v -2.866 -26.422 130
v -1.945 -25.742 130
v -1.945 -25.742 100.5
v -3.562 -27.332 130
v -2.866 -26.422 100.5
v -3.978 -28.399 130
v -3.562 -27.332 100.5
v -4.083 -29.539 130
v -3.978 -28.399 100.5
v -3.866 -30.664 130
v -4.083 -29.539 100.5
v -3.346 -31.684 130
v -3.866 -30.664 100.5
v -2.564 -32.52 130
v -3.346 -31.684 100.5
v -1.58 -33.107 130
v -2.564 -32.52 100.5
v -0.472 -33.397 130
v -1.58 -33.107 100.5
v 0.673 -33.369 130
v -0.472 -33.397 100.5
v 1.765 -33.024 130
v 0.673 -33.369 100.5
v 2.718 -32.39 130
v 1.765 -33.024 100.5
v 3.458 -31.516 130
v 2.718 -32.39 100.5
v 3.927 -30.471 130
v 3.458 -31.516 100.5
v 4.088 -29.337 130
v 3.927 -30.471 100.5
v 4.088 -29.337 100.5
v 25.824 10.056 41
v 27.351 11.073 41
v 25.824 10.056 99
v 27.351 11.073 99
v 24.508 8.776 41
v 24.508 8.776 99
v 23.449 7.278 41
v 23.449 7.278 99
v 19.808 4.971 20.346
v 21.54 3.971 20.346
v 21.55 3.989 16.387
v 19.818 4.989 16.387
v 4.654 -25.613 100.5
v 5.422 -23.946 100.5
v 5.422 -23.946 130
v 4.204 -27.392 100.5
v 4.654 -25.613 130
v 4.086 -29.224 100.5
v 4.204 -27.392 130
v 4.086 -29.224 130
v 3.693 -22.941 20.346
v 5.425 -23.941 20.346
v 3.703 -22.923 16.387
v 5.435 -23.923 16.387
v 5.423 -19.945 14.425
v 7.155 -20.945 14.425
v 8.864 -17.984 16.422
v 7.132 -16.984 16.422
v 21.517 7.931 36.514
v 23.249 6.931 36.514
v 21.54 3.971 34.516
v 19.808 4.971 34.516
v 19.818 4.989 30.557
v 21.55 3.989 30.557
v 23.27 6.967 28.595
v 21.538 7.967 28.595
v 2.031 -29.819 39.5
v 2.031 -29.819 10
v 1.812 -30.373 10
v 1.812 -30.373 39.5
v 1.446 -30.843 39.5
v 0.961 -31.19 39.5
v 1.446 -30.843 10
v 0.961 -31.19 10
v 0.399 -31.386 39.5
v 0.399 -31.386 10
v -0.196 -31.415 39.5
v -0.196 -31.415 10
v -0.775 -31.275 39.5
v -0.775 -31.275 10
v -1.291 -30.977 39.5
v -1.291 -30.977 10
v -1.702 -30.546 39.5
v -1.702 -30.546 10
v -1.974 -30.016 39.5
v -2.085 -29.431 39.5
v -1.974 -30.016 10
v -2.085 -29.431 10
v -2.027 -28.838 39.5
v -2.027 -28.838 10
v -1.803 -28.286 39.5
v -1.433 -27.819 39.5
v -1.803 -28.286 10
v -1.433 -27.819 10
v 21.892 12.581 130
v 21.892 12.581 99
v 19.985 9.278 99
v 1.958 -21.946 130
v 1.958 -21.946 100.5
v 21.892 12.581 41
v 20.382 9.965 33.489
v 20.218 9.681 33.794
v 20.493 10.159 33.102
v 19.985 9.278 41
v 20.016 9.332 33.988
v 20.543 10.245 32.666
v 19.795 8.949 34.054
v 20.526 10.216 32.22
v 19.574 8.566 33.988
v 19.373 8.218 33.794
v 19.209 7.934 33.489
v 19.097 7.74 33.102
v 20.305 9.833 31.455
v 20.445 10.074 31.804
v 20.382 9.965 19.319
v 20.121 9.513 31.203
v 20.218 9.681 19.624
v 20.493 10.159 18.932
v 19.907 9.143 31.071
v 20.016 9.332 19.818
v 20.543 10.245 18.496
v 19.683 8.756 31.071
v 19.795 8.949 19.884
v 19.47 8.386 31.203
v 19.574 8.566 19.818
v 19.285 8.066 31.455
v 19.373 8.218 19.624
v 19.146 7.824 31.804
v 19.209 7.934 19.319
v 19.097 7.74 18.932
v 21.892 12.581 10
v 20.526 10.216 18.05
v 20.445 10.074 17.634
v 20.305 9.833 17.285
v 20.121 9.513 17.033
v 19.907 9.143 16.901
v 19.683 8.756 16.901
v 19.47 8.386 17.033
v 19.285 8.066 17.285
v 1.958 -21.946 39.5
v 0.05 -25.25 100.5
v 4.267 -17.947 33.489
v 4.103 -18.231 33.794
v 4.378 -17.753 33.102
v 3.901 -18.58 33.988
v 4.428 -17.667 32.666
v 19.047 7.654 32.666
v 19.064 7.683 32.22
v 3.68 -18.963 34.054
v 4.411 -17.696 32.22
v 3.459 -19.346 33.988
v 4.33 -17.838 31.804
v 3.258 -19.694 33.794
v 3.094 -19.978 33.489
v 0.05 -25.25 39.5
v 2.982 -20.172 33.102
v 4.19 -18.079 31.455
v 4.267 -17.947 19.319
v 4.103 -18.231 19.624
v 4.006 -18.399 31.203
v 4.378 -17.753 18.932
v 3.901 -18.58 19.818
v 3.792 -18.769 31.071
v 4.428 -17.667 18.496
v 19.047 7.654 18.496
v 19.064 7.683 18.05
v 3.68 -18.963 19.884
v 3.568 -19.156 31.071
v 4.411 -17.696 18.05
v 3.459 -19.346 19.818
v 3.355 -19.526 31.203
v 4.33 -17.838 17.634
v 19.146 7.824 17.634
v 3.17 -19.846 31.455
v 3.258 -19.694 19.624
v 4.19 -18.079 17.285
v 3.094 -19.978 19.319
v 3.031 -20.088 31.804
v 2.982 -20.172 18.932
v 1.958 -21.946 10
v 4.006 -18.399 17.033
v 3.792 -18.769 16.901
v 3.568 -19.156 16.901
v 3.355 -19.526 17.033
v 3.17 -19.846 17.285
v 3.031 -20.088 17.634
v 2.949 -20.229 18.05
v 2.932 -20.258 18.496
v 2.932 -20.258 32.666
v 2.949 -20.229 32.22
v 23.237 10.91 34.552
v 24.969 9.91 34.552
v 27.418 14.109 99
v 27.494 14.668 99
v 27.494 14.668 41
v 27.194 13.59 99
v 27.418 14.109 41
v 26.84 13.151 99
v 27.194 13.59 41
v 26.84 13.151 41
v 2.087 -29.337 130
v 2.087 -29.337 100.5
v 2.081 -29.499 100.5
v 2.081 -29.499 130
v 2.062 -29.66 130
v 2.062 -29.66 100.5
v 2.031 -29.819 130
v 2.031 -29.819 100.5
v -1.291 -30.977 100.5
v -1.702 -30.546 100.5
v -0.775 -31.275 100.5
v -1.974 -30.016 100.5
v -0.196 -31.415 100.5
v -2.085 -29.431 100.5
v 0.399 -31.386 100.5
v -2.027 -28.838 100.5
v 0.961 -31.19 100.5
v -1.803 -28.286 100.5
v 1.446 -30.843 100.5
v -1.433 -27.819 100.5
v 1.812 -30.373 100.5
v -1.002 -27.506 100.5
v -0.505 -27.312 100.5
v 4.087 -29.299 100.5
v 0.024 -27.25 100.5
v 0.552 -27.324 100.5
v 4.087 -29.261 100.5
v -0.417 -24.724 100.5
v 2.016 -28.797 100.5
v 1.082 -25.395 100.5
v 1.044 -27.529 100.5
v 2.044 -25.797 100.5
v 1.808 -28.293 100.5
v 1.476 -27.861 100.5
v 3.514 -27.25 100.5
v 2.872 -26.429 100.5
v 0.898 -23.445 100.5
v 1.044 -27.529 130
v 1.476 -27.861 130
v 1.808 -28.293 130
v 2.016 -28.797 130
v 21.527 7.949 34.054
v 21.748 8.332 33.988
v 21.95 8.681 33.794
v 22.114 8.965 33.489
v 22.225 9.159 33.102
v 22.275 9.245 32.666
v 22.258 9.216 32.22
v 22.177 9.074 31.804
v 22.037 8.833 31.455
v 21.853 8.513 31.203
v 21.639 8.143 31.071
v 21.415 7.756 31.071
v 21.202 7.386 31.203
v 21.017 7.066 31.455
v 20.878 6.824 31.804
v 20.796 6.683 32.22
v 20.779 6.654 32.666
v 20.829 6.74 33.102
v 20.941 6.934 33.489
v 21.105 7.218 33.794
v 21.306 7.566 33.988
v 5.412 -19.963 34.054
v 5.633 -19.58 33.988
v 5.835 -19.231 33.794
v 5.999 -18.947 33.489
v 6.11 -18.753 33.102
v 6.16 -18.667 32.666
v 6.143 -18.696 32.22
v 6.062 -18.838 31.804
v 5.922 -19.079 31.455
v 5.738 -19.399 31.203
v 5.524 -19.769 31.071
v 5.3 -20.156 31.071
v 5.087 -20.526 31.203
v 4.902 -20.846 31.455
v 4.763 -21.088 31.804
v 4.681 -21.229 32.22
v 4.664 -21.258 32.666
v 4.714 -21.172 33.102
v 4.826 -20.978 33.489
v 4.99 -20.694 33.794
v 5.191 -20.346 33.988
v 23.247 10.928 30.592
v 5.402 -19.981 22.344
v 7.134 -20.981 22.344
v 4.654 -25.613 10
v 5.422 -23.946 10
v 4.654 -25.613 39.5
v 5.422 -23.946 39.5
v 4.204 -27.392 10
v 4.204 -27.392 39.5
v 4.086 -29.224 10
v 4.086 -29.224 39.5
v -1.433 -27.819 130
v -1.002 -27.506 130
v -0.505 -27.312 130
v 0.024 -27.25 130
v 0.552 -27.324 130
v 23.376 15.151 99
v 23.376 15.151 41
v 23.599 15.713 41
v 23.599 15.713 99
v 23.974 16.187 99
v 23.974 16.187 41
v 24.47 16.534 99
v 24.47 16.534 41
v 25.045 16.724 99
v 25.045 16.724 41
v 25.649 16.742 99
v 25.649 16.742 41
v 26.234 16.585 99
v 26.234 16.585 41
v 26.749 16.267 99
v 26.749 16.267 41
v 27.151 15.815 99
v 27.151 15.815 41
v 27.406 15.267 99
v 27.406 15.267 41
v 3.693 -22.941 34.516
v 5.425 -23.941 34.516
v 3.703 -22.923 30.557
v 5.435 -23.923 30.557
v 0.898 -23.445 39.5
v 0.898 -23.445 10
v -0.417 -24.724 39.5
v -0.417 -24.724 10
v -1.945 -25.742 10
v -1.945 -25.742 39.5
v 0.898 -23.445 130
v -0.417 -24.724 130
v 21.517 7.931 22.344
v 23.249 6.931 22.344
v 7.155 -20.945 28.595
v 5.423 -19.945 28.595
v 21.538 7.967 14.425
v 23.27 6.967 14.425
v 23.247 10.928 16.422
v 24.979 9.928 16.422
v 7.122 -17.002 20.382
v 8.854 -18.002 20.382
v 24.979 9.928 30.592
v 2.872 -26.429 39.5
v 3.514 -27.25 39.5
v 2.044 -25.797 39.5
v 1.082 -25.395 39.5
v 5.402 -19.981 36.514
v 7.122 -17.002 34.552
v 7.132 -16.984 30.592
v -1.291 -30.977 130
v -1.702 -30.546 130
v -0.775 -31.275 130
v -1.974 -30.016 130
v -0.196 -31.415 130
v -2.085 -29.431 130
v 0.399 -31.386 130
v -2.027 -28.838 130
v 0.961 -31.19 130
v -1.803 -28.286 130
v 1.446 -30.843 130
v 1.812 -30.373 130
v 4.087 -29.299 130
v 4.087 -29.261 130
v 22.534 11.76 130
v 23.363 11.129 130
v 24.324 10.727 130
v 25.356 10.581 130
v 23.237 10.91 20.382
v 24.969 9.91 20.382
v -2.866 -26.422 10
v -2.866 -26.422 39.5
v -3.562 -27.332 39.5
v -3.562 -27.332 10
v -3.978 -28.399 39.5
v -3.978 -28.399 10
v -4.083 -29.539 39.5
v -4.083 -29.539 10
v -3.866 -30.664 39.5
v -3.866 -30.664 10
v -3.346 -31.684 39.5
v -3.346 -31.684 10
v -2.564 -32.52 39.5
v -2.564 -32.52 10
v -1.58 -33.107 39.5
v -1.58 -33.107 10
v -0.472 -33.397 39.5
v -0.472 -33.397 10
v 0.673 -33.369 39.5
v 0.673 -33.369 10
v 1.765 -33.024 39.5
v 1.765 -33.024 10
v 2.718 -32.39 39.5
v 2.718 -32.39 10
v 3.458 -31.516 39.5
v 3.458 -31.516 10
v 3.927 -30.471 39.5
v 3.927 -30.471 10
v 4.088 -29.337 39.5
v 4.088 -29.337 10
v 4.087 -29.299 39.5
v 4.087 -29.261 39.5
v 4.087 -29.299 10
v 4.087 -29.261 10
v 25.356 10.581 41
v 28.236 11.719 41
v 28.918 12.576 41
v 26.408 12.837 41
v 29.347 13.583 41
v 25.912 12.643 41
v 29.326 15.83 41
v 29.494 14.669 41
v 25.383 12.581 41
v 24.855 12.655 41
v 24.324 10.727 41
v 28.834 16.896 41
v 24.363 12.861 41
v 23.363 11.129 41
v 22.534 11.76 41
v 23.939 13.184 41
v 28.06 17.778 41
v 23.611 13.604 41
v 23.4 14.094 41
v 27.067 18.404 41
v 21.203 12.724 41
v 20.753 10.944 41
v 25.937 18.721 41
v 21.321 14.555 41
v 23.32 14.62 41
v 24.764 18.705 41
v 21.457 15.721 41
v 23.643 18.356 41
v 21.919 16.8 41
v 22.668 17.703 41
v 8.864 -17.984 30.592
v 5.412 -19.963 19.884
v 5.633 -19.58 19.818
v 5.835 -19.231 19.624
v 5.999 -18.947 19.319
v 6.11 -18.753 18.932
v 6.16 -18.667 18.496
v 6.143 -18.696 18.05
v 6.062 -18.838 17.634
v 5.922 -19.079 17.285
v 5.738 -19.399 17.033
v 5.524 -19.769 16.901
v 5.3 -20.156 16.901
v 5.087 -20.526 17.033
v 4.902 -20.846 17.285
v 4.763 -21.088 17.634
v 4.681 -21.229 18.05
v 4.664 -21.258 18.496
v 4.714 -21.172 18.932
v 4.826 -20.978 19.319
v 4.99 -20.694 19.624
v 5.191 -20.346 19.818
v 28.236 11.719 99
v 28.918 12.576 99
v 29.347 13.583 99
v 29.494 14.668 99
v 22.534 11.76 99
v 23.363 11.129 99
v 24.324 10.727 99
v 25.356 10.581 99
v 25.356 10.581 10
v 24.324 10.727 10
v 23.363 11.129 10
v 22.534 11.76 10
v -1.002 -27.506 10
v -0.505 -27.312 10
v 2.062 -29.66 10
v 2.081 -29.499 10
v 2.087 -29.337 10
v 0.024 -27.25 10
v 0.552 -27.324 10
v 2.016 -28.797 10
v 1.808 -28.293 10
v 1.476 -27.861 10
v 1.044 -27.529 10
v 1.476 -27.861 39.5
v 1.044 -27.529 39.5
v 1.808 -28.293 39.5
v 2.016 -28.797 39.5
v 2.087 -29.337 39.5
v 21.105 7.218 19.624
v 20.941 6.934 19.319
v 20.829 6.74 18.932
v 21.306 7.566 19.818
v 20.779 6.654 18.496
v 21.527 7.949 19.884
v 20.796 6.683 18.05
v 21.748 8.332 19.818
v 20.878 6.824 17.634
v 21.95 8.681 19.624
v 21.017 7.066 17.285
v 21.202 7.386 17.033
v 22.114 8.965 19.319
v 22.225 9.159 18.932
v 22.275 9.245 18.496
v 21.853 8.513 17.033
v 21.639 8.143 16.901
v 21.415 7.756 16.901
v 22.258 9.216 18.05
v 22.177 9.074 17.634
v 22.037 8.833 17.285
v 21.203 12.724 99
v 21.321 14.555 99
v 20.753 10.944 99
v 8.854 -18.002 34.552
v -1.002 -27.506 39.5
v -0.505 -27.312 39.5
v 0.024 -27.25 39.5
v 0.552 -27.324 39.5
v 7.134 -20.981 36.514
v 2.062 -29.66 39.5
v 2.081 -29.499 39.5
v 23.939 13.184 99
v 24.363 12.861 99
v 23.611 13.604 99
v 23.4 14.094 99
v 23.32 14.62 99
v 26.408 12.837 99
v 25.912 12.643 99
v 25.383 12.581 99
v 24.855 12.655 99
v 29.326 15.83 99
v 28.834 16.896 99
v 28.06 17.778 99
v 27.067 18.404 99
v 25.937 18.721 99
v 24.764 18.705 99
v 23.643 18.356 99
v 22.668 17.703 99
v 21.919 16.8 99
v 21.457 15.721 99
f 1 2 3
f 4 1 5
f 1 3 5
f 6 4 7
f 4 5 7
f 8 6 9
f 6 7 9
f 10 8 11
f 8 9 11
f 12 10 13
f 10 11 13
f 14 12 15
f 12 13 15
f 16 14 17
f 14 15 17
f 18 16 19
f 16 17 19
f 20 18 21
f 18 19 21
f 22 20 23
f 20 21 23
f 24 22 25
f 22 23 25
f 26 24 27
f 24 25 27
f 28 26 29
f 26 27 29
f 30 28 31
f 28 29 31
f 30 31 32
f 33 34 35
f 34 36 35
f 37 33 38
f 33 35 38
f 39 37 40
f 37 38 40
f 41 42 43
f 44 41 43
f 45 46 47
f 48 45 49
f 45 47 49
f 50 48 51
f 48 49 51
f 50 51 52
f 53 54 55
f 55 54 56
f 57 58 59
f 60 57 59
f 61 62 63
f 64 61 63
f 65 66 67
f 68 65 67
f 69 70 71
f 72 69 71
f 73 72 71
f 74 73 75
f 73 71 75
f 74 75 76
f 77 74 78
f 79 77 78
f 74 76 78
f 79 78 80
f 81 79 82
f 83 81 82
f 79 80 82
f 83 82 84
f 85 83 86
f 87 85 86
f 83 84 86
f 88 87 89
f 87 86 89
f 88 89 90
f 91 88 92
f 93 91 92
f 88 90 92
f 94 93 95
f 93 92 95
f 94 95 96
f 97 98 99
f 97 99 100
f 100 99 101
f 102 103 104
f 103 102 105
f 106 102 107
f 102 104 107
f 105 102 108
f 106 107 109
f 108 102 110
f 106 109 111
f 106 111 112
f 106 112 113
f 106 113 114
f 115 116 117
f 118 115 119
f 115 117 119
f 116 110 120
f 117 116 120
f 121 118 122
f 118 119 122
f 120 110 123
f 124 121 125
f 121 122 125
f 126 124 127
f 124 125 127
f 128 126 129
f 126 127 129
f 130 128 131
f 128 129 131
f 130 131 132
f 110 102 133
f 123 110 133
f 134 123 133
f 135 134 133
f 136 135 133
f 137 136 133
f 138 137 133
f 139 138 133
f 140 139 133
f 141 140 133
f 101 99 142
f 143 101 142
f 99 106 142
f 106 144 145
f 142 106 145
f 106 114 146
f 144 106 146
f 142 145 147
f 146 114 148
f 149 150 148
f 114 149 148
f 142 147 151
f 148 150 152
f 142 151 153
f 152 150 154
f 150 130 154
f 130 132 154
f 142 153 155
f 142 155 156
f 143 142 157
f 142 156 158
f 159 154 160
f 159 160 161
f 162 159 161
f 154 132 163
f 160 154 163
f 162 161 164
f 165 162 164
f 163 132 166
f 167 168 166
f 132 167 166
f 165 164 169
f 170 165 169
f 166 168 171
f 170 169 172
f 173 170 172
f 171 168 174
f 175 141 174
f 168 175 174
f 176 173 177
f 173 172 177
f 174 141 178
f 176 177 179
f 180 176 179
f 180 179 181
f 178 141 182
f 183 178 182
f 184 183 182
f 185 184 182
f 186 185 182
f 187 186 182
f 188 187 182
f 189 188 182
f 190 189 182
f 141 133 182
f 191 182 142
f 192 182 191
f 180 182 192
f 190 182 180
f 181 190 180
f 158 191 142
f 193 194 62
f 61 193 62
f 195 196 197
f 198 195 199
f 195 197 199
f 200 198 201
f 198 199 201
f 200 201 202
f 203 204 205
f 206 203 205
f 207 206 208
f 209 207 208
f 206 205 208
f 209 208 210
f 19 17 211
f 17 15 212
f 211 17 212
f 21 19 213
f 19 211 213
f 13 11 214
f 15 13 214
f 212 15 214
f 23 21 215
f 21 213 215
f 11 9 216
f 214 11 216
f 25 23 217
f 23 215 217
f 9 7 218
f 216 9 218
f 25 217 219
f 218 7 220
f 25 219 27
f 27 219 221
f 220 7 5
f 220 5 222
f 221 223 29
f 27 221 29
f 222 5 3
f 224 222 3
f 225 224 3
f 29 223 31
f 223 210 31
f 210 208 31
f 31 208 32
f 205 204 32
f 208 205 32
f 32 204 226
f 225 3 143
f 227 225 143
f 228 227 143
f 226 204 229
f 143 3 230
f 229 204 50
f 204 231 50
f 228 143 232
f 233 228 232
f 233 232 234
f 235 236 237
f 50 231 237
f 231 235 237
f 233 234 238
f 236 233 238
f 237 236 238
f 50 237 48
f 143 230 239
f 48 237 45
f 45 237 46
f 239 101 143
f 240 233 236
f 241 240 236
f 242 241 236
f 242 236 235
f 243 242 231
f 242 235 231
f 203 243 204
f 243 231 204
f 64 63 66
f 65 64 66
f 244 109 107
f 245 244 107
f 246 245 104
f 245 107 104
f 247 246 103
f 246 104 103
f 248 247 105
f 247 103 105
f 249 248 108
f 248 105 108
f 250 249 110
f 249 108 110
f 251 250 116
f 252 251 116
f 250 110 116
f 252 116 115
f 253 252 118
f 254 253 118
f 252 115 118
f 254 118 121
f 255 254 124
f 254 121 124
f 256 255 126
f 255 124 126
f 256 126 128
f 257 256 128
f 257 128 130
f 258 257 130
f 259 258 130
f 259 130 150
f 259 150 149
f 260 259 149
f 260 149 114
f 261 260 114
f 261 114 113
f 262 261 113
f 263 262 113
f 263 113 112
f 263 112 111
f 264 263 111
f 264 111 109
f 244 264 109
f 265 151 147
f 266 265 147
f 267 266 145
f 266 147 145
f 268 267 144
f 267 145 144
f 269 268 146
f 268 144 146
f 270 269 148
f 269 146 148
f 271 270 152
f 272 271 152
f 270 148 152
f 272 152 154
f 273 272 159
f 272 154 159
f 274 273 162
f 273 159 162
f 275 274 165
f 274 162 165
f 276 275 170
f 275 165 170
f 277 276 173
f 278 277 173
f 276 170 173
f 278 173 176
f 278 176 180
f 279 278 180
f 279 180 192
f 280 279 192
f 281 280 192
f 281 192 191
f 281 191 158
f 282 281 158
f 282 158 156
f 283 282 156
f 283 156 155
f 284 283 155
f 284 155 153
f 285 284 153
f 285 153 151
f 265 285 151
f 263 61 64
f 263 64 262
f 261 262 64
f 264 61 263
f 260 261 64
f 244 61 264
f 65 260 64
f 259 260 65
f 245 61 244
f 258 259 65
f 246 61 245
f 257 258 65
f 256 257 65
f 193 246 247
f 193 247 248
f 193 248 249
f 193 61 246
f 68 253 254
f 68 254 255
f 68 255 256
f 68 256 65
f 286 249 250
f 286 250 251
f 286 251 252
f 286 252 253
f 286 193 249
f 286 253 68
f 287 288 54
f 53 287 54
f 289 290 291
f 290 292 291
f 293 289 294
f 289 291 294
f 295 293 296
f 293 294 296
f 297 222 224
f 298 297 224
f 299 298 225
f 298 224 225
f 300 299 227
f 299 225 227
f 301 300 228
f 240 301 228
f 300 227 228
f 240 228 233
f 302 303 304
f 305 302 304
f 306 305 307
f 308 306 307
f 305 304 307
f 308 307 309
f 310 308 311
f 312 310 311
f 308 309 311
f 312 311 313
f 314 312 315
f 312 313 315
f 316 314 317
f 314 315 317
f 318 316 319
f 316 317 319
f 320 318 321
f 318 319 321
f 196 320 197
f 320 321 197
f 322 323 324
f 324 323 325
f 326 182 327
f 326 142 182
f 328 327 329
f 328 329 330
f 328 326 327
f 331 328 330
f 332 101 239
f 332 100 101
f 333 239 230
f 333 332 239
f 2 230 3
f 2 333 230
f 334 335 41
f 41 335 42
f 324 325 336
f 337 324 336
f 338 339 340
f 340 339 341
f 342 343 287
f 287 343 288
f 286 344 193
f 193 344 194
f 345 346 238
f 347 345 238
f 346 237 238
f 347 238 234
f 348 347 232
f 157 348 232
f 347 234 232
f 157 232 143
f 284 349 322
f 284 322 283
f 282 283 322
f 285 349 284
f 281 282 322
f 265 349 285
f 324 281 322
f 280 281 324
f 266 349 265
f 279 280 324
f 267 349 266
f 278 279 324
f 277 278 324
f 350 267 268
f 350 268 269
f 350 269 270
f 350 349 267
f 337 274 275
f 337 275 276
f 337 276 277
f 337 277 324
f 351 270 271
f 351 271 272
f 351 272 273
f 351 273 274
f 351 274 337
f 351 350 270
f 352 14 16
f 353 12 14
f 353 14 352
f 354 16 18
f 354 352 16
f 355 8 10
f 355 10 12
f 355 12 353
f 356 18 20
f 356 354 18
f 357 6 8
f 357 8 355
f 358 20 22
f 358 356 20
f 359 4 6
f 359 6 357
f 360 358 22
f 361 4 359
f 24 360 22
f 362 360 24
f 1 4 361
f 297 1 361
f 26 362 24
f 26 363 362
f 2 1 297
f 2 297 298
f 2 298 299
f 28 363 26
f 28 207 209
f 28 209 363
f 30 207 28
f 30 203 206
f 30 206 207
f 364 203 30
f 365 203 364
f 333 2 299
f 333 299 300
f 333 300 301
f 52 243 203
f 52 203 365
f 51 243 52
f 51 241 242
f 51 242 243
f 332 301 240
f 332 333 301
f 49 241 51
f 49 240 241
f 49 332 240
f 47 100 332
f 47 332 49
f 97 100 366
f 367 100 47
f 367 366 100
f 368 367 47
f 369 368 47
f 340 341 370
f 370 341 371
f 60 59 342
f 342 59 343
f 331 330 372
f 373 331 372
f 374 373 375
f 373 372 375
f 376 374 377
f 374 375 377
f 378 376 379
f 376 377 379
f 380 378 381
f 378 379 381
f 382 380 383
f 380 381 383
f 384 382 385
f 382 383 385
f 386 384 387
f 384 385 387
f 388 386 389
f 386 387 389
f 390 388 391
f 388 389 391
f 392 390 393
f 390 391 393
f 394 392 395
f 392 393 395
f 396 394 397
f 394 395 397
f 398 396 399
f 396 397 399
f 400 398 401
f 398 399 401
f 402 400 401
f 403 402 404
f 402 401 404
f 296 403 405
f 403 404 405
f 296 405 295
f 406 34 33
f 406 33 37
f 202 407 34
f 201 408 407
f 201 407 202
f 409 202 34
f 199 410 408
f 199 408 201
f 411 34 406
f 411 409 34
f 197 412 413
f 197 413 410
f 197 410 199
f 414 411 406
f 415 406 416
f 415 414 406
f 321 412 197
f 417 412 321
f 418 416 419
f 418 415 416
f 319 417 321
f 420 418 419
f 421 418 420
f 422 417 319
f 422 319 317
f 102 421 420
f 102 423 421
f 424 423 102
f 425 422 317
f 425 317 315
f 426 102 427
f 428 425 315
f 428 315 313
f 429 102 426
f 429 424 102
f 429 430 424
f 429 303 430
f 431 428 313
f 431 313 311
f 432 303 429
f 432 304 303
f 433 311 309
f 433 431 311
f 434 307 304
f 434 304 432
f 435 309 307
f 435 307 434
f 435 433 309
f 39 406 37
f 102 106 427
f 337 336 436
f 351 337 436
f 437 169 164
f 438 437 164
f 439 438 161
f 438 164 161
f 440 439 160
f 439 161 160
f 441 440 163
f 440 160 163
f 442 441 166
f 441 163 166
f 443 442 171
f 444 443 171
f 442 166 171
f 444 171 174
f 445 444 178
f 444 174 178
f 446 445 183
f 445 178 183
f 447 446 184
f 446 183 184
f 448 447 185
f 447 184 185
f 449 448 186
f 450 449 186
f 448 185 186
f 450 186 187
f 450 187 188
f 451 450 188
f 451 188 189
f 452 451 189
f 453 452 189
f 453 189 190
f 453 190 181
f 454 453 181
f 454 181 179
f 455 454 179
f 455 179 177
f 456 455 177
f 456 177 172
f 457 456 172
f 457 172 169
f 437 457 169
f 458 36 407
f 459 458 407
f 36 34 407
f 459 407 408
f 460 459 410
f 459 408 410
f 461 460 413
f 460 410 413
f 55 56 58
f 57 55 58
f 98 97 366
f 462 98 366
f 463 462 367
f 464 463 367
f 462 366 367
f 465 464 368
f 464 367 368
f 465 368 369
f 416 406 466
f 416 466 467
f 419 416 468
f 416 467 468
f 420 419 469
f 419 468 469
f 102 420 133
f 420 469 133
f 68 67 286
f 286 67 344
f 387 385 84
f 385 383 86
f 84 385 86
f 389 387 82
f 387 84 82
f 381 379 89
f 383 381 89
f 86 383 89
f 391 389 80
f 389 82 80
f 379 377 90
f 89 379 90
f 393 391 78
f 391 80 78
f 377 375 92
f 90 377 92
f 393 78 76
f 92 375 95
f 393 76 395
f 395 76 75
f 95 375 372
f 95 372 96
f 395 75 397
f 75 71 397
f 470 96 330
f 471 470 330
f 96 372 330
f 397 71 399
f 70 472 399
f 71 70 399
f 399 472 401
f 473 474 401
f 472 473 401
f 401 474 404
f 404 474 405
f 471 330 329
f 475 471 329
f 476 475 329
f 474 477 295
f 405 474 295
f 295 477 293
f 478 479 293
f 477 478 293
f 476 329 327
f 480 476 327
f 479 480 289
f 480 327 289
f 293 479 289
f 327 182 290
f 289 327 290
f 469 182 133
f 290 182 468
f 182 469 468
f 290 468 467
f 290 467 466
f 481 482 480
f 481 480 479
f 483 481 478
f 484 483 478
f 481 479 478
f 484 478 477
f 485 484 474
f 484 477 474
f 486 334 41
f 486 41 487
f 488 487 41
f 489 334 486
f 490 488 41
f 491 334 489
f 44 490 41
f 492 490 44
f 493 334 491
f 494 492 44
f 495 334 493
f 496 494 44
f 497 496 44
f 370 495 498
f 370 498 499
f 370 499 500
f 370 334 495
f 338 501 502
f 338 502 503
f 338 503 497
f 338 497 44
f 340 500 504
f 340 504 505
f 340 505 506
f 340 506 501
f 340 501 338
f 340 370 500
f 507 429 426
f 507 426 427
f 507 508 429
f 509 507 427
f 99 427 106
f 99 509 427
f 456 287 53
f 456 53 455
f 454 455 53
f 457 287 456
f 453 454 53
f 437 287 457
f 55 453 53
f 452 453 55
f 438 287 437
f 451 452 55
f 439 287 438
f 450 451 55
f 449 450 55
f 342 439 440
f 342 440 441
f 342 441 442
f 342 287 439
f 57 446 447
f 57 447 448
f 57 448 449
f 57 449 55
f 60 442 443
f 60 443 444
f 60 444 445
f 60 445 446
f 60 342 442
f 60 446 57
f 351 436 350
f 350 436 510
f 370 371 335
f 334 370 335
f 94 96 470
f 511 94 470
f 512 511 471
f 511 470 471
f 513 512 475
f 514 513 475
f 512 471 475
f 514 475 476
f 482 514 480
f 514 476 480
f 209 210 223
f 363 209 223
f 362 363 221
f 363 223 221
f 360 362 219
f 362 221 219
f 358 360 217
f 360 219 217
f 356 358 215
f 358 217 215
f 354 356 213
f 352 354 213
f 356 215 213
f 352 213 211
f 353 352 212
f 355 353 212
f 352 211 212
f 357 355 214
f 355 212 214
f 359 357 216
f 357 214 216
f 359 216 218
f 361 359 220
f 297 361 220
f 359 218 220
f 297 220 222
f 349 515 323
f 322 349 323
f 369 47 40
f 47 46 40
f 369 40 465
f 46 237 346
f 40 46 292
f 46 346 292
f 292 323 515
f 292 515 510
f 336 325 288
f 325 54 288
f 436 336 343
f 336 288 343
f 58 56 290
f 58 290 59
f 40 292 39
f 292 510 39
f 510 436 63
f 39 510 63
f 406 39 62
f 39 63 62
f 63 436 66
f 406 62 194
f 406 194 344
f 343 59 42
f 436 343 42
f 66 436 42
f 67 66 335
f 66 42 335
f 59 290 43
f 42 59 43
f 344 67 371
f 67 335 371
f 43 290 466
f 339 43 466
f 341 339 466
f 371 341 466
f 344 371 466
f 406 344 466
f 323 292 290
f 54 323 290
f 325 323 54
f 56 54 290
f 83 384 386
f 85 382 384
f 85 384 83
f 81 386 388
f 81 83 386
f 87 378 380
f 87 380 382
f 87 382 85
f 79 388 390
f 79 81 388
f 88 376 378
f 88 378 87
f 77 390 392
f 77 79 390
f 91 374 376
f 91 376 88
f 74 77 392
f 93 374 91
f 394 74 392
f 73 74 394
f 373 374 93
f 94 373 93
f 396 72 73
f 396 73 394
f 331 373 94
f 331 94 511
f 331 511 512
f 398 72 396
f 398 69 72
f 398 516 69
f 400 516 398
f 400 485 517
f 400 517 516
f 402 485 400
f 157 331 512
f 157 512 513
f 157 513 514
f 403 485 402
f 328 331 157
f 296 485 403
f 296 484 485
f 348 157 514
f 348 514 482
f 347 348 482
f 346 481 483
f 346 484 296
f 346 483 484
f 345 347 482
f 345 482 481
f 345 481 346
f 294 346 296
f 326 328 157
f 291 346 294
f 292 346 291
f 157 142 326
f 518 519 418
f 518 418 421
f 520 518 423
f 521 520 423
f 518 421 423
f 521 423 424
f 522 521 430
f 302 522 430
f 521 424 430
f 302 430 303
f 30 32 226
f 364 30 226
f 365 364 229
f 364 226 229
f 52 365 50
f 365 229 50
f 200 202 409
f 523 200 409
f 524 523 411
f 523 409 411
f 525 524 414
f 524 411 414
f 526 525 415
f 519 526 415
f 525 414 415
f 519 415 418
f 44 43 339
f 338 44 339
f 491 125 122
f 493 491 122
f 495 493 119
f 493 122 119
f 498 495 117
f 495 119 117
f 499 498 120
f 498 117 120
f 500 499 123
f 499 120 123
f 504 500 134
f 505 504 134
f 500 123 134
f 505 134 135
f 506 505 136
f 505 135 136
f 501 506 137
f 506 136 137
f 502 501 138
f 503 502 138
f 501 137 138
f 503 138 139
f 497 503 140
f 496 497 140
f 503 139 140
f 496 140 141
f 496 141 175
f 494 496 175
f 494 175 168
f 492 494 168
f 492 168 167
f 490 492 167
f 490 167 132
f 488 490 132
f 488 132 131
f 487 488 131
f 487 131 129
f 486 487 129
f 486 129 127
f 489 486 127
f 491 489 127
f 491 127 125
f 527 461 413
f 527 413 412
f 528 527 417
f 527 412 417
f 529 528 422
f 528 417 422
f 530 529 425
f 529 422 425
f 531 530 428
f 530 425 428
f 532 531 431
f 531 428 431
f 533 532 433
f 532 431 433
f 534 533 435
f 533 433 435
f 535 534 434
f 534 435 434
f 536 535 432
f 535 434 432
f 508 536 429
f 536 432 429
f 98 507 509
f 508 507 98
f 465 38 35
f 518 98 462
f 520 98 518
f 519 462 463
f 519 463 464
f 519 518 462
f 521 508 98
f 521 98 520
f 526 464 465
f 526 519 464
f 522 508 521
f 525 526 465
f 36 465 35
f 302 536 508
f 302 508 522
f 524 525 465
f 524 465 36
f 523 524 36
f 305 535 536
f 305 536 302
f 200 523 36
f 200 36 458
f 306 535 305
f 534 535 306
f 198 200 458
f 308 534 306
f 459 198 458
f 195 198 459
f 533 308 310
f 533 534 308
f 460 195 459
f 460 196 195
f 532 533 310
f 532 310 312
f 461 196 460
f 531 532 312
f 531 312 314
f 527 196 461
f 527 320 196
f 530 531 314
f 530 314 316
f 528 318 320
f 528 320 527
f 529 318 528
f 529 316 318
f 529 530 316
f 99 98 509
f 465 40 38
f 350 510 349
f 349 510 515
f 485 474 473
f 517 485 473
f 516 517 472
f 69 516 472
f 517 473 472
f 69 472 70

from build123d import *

# Parameters (mm, degrees)
SKETCH2_R               = 1.5875
BOSS_EXTRUDE1_DEPTH     = 10
BOSS_EXTRUDE2_DEPTH     = 120
SKETCH4_R               = 4.0875
CUT_EXTRUDE1_DEPTH      = 30.5
CUT_EXTRUDE1_DEPTH_BACK = 30.5
SKETCH5_R               = 4.0875
CUT_EXTRUDE2_DEPTH      = 31
SKETCH6_R               = 4.0875
CUT_EXTRUDE3_DEPTH      = 31
FILLET1_R               = 10
SKETCH7_R               = 1.5
CUT_EXTRUDE4_DEPTH      = 4
SKETCH8_R               = 1.5
CUT_EXTRUDE5_DEPTH      = 2


with BuildPart() as part:
    # Sketch2 → Boss-Extrude1 (new body)
    with BuildSketch(Plane.XY):
        with BuildLine():
            Line((0, -27.7495), (0, 0))
            Line((0, 0), (38.1, 0))
            ThreePointArc((38.1, 0), (-26.940768363, 26.940768363), (0, -38.1))
            Line((0, -38.1), (0, -30.9245))
            ThreePointArc((0, -30.9245), (-1.5875, -29.337), (0, -27.7495))
        make_face()
        with Locations((-25.406587271, 14.6685)):
            Circle(SKETCH2_R, mode=Mode.SUBTRACT)
        with Locations((25.406587271, 14.6685)):
            Circle(SKETCH2_R, mode=Mode.SUBTRACT)
        with BuildLine():
            Line((38.1, 0), (0, 0))
            Line((0, 0), (0, -27.7495))
            ThreePointArc((0, -27.7495), (1.122532015, -28.214467985), (1.5875, -29.337))
            ThreePointArc((1.5875, -29.337), (1.122532015, -30.459532015), (0, -30.9245))
            Line((0, -30.9245), (0, -38.1))
            ThreePointArc((0, -38.1), (26.940768363, -26.940768363), (38.1, 0))
        make_face()
    extrude(amount=BOSS_EXTRUDE1_DEPTH)


with BuildPart() as body_2:
    # Sketch3 → Boss-Extrude2 (new body)
    with BuildSketch(Plane.XY.offset(10)):
        with BuildLine():
            ThreePointArc((29.494087271, 14.6685), (24.324372064, 18.610132466), (21.892146477, 12.581309985))
            Line((21.892146477, 12.581309985), (23.37551462, 15.150578976))
            ThreePointArc((23.37551462, 15.150578976), (25.649272347, 16.741845172), (27.494087271, 14.6685))
            ThreePointArc((27.494087271, 14.6685), (27.323499399, 13.841998855), (26.839616236, 13.150578976))
            Line((26.839616236, 13.150578976), (25.356248092, 10.581309985))
            ThreePointArc((25.356248092, 10.581309985), (28.279033516, 11.760457906), (29.494087271, 14.6685))
        make_face()
        with BuildLine():
            Line((24.362837271, 12.86067197), (23.362837271, 11.128621162))
            ThreePointArc((23.362837271, 11.128621162), (24.324372064, 10.726867534), (25.356248092, 10.581309985))
            Line((25.356248092, 10.581309985), (26.839616236, 13.150578976))
            ThreePointArc((26.839616236, 13.150578976), (25.649272347, 12.595154828), (24.362837271, 12.86067197))
        make_face()
        with BuildLine():
            ThreePointArc((21.892146477, 12.581309985), (22.534141026, 11.760457906), (23.362837271, 11.128621162))
            Line((23.362837271, 11.128621162), (24.362837271, 12.86067197))
            ThreePointArc((24.362837271, 12.86067197), (23.489675143, 13.841998855), (23.37551462, 15.150578976))
            Line((23.37551462, 15.150578976), (21.892146477, 12.581309985))
        make_face()
        with BuildLine():
            Line((23.362837271, 11.128621162), (2.04375, -25.797121162))
            ThreePointArc((2.04375, -25.797121162), (2.872446245, -26.428957906), (3.514440794, -27.249809985))
            Line((3.514440794, -27.249809985), (25.356248092, 10.581309985))
            ThreePointArc((25.356248092, 10.581309985), (24.324372064, 10.726867534), (23.362837271, 11.128621162))
        make_face()
        with BuildLine():
            ThreePointArc((0.050339179, -25.249809985), (1.082215206, -25.395367534), (2.04375, -25.797121162))
            Line((2.04375, -25.797121162), (23.362837271, 11.128621162))
            ThreePointArc((23.362837271, 11.128621162), (22.534141026, 11.760457906), (21.892146477, 12.581309985))
            Line((21.892146477, 12.581309985), (0.050339179, -25.249809985))
        make_face()
        with BuildLine():
            ThreePointArc((-1.433028965, -27.819078976), (-0.242685076, -27.263654828), (1.04375, -27.52917197))
            Line((1.04375, -27.52917197), (2.04375, -25.797121162))
            ThreePointArc((2.04375, -25.797121162), (1.082215206, -25.395367534), (0.050339179, -25.249809985))
            Line((0.050339179, -25.249809985), (-1.433028965, -27.819078976))
        make_face()
        with BuildLine():
            Line((2.04375, -25.797121162), (1.04375, -27.52917197))
            ThreePointArc((1.04375, -27.52917197), (1.80782803, -28.29325), (2.0875, -29.337))
            ThreePointArc((2.0875, -29.337), (2.073345172, -29.579685076), (2.03107265, -29.819078976))
            Line((2.03107265, -29.819078976), (3.514440794, -27.249809985))
            ThreePointArc((3.514440794, -27.249809985), (2.872446245, -26.428957906), (2.04375, -25.797121162))
        make_face()
        with BuildLine():
            ThreePointArc((2.03107265, -29.819078976), (-1.04375, -31.14482803), (-1.433028965, -27.819078976))
            Line((-1.433028965, -27.819078976), (0.050339179, -25.249809985))
            ThreePointArc((0.050339179, -25.249809985), (-2.908042094, -32.209446245), (4.0875, -29.337))
            ThreePointArc((4.0875, -29.337), (3.941632466, -28.254784794), (3.514440794, -27.249809985))
            Line((3.514440794, -27.249809985), (2.03107265, -29.819078976))
        make_face()
    extrude(amount=BOSS_EXTRUDE2_DEPTH)

    # Sketch4 → Cut-Extrude1 (cut, two sides)
    with BuildSketch(Plane.XY.offset(70)) as cut_extrude1_sk:
        with Locations((0, -29.337)):
            Circle(SKETCH4_R)
    extrude(amount=CUT_EXTRUDE1_DEPTH, mode=Mode.SUBTRACT)
    extrude(cut_extrude1_sk.sketch, amount=-CUT_EXTRUDE1_DEPTH_BACK, mode=Mode.SUBTRACT)

    # Sketch5 → Cut-Extrude2 (cut)
    with BuildSketch(Plane(origin=(0, 0, 10), x_dir=(-1, 0, 0), z_dir=(0, 0, -1))):
        with Locations((-25.406587271, 14.6685)):
            Circle(SKETCH5_R)
    extrude(amount=-CUT_EXTRUDE2_DEPTH, mode=Mode.SUBTRACT)

    # Sketch6 → Cut-Extrude3 (cut)
    with BuildSketch(Plane.XY.offset(130)):
        with Locations((25.406587271, 14.6685)):
            Circle(SKETCH6_R)
    extrude(amount=-CUT_EXTRUDE3_DEPTH, mode=Mode.SUBTRACT)

    # Fillet1
    fillet1_edges = [body_2.edges().sort_by_distance(p)[0] for p in [
        (0.050339179, -25.249809985, 115.25),
        (3.514440794, -27.249809985, 115.25),
        (0.050339179, -25.249809985, 24.75),
        (3.514440794, -27.249809985, 24.75),
        (21.892146477, 12.581309985, 70),
        (25.356248092, 10.581309985, 70),
    ]]
    fillet(fillet1_edges, radius=FILLET1_R)

    # Sketch7 → Cut-Extrude4 (cut)
    with BuildSketch(Plane(origin=(10.971242828, -6.33425, 0), x_dir=(0, 0, 1), z_dir=(-0.866025404, 0.5, 0))):
        with Locations((18.38424077, -14.582087011)):
            Circle(SKETCH7_R)
        with Locations((18.38424077, 17.647912989)):
            Circle(SKETCH7_R)
        with Locations((32.55424077, 17.647912989)):
            Circle(SKETCH7_R)
        with Locations((32.55424077, -14.582087011)):
            Circle(SKETCH7_R)
    extrude(amount=-CUT_EXTRUDE4_DEPTH, mode=Mode.SUBTRACT)

    # Sketch8 → Cut-Extrude5 (cut)
    with BuildSketch(Plane(origin=(14.435344443, -8.33425, 0), x_dir=(0, 0, -1), z_dir=(0.866025404, -0.5, 0))):
        with Locations((-18.38424077, -14.582087011)):
            Circle(SKETCH8_R)
        Polygon((-34.516051881, 14.208627429), (-30.556637659, 14.22929195), (-28.594826548, 17.66857751), (-30.592429659, 21.08719855), (-34.55184388, 21.066534029), (-36.513654991, 17.627248469), align=None)
        with Locations((-18.38424077, 17.647912989)):
            Circle(SKETCH8_R)
        Polygon((-34.516051881, -18.021372571), (-30.556637659, -18.00070805), (-28.594826548, -14.56142249), (-30.592429659, -11.14280145), (-34.55184388, -11.163465971), (-36.513654991, -14.602751531), align=None)
        with Locations((-32.55424077, 17.647912989)):
            Circle(SKETCH8_R)
        Polygon((-20.346051881, -18.021372571), (-16.386637659, -18.00070805), (-14.424826548, -14.56142249), (-16.422429659, -11.14280145), (-20.38184388, -11.163465971), (-22.343654991, -14.602751531), align=None)
        Polygon((-20.346051881, 14.208627429), (-16.386637659, 14.22929195), (-14.424826548, 17.66857751), (-16.422429659, 21.08719855), (-20.38184388, 21.066534029), (-22.343654991, 17.627248469), align=None)
    extrude(amount=-CUT_EXTRUDE5_DEPTH, mode=Mode.SUBTRACT)


solid = body_2.part
